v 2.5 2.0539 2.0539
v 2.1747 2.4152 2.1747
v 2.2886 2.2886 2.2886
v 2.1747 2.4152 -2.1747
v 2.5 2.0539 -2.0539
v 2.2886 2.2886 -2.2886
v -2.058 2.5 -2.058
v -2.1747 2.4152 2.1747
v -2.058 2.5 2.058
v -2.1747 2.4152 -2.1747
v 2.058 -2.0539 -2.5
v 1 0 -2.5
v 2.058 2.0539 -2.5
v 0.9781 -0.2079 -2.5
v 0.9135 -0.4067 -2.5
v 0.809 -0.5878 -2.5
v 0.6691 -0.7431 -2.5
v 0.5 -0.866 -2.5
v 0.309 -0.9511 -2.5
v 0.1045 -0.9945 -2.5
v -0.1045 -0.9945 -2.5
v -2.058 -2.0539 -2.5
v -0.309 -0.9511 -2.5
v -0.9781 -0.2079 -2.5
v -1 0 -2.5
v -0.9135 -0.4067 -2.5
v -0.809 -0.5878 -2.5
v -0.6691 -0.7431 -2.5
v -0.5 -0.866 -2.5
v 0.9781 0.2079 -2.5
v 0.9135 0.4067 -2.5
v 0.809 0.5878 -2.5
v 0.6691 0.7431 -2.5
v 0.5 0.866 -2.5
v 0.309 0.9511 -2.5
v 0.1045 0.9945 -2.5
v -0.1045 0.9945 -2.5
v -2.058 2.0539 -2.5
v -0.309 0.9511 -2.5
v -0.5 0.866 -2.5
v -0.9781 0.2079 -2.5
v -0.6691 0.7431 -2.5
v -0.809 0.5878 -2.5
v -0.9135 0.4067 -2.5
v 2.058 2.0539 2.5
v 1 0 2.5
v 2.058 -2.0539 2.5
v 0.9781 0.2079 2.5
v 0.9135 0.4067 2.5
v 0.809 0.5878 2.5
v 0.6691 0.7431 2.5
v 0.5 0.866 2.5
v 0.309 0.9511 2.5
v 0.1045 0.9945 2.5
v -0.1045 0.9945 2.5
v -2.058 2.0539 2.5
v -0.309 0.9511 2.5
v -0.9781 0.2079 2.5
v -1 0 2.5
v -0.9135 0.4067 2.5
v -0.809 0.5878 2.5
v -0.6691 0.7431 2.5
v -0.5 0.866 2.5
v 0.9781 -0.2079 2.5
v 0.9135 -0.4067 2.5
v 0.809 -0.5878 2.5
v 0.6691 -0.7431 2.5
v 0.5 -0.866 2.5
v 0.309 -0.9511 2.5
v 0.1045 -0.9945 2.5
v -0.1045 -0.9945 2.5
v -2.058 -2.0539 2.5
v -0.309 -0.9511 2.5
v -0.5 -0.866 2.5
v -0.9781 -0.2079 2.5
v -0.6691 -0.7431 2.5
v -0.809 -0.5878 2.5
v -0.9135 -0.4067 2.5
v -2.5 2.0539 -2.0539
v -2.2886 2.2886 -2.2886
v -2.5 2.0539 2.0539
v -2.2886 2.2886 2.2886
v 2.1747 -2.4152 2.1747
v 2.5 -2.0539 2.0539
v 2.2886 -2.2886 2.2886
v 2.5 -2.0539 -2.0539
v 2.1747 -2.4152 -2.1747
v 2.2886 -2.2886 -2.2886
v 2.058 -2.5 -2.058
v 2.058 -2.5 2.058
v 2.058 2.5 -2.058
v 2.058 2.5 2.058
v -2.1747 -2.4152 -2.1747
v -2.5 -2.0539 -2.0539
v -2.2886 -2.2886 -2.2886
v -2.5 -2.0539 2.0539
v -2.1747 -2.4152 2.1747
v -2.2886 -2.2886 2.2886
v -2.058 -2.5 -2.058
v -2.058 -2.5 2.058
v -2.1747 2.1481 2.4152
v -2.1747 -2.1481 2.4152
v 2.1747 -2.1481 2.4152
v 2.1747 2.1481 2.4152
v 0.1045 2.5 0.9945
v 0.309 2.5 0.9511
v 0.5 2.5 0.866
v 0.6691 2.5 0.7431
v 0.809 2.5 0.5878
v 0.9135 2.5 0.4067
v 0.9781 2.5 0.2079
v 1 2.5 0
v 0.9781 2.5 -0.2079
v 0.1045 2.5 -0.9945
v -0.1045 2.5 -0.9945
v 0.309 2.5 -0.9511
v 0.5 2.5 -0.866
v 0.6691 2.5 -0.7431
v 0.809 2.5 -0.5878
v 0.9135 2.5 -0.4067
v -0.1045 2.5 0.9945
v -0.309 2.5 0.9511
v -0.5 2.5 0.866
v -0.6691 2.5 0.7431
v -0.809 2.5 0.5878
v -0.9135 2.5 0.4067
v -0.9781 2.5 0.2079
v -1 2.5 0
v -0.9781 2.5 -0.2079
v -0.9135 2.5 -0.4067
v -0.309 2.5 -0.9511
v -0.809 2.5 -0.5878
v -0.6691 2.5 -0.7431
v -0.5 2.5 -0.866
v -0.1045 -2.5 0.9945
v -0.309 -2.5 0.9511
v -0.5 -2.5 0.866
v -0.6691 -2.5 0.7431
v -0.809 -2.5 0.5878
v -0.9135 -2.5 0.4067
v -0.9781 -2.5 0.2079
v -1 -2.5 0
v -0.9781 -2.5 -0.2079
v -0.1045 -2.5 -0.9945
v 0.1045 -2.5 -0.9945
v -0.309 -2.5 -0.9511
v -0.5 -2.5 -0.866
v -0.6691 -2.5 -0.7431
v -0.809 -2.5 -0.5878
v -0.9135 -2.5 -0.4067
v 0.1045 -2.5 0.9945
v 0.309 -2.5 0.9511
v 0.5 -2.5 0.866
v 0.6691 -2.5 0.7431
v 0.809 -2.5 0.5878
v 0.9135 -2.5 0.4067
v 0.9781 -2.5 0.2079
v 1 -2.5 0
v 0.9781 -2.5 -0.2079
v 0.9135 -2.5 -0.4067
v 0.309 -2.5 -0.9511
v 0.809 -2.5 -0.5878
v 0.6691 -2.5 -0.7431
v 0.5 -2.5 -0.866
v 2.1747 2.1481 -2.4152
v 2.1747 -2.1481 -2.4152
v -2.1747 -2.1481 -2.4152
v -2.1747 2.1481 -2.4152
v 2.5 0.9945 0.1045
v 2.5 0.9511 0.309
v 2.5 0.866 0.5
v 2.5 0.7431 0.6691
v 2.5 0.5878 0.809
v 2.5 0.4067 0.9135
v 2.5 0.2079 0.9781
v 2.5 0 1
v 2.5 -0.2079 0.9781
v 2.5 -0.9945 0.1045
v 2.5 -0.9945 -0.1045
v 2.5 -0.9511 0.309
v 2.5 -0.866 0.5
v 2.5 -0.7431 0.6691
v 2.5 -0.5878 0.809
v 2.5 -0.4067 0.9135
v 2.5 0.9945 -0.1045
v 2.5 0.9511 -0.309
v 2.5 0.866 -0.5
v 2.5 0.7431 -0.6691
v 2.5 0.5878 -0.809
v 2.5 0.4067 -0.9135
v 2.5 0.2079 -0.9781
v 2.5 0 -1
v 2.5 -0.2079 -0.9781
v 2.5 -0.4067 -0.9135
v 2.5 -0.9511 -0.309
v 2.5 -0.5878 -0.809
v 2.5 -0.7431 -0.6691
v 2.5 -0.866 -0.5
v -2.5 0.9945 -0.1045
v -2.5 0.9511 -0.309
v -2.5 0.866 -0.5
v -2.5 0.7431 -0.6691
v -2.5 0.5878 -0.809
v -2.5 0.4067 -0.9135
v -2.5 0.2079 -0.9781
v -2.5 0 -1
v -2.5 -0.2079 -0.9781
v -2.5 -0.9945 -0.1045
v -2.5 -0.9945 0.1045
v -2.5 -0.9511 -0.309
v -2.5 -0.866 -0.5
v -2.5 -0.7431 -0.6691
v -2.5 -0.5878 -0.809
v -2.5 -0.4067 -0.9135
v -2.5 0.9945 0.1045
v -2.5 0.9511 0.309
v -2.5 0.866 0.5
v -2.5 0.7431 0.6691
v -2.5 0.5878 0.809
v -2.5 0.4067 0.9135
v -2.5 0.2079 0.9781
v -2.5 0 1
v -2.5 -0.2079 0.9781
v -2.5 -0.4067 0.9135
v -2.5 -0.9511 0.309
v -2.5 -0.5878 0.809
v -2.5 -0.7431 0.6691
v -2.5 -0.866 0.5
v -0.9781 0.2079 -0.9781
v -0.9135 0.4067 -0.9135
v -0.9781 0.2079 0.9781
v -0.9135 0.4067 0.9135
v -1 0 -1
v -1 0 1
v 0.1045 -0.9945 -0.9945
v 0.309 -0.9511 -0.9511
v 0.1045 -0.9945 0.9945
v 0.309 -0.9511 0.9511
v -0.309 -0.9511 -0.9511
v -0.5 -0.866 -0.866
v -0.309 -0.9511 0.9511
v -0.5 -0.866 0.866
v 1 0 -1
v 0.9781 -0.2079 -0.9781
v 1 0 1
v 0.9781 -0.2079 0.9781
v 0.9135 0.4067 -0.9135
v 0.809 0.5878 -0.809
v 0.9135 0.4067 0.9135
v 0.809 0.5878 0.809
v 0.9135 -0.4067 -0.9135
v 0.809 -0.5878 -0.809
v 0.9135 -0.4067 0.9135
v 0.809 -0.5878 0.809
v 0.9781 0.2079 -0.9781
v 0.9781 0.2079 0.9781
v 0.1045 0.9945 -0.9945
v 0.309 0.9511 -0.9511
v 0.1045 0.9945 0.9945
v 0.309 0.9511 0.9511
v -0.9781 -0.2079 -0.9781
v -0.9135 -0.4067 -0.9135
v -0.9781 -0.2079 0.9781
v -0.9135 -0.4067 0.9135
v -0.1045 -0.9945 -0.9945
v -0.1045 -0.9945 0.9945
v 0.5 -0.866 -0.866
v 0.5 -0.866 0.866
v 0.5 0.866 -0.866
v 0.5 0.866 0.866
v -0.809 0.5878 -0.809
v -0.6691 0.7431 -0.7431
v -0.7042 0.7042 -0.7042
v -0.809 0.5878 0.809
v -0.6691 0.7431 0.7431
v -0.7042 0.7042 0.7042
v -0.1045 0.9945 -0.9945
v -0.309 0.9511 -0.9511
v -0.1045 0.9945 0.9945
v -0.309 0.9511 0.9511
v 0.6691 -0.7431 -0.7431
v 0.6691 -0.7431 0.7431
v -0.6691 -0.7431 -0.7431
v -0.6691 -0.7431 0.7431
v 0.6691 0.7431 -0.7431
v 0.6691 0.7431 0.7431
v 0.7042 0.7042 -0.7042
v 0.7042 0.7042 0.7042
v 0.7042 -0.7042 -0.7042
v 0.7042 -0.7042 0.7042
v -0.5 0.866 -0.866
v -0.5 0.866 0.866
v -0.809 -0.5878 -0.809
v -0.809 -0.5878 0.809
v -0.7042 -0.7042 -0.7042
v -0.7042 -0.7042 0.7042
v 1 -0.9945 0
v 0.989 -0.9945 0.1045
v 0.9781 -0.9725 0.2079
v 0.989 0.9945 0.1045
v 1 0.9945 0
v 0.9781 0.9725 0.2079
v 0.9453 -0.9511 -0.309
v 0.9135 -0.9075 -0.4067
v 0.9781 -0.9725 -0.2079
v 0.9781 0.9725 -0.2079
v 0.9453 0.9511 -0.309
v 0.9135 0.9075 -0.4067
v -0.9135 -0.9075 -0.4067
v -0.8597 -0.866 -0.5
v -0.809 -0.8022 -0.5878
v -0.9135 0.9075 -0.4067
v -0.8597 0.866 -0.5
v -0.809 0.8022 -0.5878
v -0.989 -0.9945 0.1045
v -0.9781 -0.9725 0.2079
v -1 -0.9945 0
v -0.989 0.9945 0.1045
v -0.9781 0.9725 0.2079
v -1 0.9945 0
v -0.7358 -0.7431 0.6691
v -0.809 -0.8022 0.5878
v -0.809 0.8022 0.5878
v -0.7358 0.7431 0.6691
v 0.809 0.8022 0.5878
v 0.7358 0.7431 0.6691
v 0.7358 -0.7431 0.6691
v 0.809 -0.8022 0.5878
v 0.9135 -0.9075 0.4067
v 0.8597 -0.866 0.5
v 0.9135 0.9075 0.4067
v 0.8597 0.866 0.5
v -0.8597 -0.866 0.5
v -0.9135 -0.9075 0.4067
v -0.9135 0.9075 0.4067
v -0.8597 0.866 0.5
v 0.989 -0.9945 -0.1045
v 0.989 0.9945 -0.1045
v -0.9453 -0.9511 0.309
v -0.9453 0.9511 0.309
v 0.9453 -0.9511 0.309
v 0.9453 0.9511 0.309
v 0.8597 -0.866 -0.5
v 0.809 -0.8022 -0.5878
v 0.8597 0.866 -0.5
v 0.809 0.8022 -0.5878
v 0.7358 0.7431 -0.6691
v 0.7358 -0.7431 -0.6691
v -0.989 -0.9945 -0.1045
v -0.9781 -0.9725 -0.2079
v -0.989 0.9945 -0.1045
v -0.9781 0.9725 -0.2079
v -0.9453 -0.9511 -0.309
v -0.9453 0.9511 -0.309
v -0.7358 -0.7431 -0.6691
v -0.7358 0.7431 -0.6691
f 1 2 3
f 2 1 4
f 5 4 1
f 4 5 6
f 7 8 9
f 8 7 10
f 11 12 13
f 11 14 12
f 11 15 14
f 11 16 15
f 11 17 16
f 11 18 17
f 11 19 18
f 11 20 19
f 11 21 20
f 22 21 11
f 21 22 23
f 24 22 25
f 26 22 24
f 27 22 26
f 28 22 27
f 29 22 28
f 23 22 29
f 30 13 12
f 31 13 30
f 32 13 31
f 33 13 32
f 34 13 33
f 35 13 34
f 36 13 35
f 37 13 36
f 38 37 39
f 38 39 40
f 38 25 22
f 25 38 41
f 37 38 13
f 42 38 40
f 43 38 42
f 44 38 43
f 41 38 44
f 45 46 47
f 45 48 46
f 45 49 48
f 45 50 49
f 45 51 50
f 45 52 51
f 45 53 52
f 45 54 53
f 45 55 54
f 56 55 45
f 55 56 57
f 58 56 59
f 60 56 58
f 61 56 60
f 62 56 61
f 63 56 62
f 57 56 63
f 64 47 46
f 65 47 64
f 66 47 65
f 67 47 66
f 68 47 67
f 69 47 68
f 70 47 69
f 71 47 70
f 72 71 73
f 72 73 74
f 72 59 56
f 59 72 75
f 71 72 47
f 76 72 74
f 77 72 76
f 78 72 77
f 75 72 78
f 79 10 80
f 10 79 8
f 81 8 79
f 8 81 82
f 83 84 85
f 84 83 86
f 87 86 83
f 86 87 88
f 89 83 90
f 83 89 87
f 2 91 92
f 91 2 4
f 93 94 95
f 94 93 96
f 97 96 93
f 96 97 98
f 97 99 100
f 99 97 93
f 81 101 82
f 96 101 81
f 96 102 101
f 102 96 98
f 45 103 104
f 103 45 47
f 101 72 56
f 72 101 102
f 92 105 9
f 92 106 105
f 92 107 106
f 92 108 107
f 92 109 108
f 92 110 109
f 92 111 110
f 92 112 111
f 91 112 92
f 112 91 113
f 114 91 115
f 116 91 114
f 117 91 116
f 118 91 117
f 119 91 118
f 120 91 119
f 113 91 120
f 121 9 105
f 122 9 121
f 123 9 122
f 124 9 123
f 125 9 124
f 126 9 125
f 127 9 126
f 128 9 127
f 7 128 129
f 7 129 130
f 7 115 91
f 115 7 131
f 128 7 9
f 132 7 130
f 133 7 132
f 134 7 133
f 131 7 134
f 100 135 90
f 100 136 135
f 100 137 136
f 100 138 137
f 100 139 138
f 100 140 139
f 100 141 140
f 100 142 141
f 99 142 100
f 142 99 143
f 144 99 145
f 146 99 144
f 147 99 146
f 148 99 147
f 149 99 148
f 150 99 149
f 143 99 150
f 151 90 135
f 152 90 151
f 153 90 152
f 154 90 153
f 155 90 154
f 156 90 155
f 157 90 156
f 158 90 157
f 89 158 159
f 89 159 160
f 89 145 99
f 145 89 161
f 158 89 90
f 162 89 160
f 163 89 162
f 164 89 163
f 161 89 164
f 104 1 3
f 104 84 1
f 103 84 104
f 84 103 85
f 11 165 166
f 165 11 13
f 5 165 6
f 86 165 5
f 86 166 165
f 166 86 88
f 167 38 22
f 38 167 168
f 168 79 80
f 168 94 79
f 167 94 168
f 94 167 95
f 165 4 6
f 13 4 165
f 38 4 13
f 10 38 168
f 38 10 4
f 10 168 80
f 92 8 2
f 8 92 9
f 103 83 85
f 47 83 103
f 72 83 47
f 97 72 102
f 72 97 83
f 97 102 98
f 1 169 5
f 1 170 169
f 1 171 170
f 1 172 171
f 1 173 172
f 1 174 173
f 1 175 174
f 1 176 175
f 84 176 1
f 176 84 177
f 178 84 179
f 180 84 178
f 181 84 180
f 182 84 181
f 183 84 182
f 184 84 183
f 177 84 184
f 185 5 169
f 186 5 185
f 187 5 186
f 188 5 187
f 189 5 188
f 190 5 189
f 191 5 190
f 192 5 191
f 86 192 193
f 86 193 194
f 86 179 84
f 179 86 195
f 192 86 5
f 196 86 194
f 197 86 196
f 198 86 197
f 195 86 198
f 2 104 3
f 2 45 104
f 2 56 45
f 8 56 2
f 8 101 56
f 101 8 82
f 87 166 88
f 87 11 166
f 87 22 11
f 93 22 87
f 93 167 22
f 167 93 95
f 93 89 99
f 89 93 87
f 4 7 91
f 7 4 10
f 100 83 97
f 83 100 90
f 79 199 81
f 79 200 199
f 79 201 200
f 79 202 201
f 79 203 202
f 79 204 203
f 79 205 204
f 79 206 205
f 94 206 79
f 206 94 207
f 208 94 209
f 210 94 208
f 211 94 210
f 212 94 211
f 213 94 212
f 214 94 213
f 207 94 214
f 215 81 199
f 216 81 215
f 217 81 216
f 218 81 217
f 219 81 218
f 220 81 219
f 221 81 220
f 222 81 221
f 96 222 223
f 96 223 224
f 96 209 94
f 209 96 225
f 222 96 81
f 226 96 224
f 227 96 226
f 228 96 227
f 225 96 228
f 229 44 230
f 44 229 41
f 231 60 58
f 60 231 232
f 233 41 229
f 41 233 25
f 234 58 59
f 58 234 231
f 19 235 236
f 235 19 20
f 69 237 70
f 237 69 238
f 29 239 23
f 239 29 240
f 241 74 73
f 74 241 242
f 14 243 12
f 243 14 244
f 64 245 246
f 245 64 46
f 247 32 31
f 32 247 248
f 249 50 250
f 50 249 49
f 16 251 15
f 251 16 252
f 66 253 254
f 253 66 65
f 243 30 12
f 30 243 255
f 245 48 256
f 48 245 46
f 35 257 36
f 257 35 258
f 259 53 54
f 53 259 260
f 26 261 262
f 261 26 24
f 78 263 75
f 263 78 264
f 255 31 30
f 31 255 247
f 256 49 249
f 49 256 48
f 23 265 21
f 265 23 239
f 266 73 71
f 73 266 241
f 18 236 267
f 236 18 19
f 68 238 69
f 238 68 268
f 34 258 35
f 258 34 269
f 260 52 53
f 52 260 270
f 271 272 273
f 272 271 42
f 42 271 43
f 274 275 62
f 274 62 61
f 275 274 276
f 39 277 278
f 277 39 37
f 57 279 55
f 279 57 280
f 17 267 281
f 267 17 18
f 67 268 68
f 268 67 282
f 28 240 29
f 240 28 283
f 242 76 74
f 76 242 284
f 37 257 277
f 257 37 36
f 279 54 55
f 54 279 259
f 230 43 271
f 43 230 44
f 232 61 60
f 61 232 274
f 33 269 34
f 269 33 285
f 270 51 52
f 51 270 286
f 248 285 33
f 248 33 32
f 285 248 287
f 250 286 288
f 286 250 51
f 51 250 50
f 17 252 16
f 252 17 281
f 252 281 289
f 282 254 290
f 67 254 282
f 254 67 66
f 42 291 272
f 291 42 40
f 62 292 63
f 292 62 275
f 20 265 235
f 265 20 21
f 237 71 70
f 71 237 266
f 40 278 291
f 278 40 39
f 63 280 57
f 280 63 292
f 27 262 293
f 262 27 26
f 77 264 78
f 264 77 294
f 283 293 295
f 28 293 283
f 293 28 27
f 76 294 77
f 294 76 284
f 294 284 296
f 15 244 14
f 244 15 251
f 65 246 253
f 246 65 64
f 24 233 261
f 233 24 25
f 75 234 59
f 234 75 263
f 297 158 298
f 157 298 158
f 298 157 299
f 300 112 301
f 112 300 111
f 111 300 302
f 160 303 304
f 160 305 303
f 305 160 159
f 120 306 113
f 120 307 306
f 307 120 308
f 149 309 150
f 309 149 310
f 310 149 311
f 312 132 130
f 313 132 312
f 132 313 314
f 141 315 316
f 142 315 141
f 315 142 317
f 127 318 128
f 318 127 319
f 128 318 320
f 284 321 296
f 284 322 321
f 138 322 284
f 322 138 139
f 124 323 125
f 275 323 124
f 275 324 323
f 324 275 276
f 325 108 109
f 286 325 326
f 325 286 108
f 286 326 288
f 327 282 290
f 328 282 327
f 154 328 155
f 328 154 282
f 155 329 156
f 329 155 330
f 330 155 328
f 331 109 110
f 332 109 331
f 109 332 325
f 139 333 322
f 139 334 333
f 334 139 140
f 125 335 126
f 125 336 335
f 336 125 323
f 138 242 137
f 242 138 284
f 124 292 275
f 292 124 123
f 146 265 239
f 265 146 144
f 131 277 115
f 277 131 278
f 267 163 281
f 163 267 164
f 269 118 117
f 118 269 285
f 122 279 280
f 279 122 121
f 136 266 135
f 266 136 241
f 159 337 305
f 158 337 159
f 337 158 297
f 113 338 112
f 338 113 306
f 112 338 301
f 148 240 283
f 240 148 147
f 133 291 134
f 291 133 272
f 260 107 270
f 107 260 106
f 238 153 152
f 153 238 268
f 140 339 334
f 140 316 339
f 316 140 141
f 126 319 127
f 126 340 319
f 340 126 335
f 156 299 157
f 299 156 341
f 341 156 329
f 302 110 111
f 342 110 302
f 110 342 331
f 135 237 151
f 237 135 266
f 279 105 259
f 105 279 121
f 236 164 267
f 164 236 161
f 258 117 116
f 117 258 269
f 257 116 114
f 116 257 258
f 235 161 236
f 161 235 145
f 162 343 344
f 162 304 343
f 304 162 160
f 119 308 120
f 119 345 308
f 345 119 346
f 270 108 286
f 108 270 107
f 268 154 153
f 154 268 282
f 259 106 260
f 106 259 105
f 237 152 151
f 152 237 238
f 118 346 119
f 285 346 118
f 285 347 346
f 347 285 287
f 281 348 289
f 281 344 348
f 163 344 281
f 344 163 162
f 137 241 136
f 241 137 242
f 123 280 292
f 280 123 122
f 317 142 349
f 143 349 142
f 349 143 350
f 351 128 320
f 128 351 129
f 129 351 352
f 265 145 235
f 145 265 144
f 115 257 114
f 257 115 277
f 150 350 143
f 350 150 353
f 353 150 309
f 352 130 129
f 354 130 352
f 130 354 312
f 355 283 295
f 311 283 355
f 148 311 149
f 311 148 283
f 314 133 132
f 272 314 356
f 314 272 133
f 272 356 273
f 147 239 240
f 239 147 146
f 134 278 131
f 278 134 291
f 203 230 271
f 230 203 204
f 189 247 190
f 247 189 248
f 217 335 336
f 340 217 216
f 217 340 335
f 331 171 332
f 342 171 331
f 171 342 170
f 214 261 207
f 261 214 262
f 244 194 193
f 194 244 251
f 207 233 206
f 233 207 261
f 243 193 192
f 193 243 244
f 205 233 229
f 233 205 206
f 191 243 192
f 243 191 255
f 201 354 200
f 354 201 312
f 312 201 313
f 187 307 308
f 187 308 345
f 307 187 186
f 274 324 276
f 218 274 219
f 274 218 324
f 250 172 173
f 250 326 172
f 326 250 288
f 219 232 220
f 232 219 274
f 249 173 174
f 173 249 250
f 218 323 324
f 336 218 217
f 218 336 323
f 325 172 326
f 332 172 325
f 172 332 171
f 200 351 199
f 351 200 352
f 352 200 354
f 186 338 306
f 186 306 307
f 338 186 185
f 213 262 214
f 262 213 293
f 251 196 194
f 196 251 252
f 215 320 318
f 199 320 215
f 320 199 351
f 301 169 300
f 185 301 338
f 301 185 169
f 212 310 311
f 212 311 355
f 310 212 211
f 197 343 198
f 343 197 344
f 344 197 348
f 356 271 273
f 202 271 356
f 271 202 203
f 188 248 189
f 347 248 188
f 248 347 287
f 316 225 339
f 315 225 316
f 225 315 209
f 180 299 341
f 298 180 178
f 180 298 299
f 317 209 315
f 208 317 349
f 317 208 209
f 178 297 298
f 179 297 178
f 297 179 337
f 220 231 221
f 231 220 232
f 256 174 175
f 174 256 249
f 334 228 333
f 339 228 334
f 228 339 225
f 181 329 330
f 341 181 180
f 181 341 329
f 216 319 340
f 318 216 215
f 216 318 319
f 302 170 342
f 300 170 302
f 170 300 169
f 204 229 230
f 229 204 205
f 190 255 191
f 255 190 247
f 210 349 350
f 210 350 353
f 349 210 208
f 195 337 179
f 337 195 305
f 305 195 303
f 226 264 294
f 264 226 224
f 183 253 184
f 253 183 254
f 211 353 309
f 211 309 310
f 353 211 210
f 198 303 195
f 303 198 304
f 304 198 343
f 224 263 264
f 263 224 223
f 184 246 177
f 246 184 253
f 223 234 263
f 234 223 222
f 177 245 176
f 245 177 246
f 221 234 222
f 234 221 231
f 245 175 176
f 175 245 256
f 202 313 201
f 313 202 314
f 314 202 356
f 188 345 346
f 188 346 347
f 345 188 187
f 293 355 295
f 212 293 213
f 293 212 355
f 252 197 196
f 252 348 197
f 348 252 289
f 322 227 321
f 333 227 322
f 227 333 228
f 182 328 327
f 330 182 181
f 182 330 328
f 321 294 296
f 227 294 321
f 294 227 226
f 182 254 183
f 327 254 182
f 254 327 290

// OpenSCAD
$fn =30;
module peghole(){
    color("Blue")cylinder (6, 1, 1, true);
}

module edge(){
cylinder (5, 3.25, 3.25, true);
}
module block(){
    intersection(){
edge();
rotate([90,0,0]) edge();
rotate([0, 90, 0]) edge();
}
}
module blox(){
difference(){ 
block();
   peghole();
rotate ([90, 0, 0]) peghole();
rotate ([0, 90, 0]) peghole();
}
}
module cross(){
blox();
translate([5,0,0]) blox();
translate([-5,0,0]) blox();
translate([0,0,5]) blox();
translate([0,0,-5]) blox();
}

blox();
//cross();
//rotate([0,45,0]) cross();
